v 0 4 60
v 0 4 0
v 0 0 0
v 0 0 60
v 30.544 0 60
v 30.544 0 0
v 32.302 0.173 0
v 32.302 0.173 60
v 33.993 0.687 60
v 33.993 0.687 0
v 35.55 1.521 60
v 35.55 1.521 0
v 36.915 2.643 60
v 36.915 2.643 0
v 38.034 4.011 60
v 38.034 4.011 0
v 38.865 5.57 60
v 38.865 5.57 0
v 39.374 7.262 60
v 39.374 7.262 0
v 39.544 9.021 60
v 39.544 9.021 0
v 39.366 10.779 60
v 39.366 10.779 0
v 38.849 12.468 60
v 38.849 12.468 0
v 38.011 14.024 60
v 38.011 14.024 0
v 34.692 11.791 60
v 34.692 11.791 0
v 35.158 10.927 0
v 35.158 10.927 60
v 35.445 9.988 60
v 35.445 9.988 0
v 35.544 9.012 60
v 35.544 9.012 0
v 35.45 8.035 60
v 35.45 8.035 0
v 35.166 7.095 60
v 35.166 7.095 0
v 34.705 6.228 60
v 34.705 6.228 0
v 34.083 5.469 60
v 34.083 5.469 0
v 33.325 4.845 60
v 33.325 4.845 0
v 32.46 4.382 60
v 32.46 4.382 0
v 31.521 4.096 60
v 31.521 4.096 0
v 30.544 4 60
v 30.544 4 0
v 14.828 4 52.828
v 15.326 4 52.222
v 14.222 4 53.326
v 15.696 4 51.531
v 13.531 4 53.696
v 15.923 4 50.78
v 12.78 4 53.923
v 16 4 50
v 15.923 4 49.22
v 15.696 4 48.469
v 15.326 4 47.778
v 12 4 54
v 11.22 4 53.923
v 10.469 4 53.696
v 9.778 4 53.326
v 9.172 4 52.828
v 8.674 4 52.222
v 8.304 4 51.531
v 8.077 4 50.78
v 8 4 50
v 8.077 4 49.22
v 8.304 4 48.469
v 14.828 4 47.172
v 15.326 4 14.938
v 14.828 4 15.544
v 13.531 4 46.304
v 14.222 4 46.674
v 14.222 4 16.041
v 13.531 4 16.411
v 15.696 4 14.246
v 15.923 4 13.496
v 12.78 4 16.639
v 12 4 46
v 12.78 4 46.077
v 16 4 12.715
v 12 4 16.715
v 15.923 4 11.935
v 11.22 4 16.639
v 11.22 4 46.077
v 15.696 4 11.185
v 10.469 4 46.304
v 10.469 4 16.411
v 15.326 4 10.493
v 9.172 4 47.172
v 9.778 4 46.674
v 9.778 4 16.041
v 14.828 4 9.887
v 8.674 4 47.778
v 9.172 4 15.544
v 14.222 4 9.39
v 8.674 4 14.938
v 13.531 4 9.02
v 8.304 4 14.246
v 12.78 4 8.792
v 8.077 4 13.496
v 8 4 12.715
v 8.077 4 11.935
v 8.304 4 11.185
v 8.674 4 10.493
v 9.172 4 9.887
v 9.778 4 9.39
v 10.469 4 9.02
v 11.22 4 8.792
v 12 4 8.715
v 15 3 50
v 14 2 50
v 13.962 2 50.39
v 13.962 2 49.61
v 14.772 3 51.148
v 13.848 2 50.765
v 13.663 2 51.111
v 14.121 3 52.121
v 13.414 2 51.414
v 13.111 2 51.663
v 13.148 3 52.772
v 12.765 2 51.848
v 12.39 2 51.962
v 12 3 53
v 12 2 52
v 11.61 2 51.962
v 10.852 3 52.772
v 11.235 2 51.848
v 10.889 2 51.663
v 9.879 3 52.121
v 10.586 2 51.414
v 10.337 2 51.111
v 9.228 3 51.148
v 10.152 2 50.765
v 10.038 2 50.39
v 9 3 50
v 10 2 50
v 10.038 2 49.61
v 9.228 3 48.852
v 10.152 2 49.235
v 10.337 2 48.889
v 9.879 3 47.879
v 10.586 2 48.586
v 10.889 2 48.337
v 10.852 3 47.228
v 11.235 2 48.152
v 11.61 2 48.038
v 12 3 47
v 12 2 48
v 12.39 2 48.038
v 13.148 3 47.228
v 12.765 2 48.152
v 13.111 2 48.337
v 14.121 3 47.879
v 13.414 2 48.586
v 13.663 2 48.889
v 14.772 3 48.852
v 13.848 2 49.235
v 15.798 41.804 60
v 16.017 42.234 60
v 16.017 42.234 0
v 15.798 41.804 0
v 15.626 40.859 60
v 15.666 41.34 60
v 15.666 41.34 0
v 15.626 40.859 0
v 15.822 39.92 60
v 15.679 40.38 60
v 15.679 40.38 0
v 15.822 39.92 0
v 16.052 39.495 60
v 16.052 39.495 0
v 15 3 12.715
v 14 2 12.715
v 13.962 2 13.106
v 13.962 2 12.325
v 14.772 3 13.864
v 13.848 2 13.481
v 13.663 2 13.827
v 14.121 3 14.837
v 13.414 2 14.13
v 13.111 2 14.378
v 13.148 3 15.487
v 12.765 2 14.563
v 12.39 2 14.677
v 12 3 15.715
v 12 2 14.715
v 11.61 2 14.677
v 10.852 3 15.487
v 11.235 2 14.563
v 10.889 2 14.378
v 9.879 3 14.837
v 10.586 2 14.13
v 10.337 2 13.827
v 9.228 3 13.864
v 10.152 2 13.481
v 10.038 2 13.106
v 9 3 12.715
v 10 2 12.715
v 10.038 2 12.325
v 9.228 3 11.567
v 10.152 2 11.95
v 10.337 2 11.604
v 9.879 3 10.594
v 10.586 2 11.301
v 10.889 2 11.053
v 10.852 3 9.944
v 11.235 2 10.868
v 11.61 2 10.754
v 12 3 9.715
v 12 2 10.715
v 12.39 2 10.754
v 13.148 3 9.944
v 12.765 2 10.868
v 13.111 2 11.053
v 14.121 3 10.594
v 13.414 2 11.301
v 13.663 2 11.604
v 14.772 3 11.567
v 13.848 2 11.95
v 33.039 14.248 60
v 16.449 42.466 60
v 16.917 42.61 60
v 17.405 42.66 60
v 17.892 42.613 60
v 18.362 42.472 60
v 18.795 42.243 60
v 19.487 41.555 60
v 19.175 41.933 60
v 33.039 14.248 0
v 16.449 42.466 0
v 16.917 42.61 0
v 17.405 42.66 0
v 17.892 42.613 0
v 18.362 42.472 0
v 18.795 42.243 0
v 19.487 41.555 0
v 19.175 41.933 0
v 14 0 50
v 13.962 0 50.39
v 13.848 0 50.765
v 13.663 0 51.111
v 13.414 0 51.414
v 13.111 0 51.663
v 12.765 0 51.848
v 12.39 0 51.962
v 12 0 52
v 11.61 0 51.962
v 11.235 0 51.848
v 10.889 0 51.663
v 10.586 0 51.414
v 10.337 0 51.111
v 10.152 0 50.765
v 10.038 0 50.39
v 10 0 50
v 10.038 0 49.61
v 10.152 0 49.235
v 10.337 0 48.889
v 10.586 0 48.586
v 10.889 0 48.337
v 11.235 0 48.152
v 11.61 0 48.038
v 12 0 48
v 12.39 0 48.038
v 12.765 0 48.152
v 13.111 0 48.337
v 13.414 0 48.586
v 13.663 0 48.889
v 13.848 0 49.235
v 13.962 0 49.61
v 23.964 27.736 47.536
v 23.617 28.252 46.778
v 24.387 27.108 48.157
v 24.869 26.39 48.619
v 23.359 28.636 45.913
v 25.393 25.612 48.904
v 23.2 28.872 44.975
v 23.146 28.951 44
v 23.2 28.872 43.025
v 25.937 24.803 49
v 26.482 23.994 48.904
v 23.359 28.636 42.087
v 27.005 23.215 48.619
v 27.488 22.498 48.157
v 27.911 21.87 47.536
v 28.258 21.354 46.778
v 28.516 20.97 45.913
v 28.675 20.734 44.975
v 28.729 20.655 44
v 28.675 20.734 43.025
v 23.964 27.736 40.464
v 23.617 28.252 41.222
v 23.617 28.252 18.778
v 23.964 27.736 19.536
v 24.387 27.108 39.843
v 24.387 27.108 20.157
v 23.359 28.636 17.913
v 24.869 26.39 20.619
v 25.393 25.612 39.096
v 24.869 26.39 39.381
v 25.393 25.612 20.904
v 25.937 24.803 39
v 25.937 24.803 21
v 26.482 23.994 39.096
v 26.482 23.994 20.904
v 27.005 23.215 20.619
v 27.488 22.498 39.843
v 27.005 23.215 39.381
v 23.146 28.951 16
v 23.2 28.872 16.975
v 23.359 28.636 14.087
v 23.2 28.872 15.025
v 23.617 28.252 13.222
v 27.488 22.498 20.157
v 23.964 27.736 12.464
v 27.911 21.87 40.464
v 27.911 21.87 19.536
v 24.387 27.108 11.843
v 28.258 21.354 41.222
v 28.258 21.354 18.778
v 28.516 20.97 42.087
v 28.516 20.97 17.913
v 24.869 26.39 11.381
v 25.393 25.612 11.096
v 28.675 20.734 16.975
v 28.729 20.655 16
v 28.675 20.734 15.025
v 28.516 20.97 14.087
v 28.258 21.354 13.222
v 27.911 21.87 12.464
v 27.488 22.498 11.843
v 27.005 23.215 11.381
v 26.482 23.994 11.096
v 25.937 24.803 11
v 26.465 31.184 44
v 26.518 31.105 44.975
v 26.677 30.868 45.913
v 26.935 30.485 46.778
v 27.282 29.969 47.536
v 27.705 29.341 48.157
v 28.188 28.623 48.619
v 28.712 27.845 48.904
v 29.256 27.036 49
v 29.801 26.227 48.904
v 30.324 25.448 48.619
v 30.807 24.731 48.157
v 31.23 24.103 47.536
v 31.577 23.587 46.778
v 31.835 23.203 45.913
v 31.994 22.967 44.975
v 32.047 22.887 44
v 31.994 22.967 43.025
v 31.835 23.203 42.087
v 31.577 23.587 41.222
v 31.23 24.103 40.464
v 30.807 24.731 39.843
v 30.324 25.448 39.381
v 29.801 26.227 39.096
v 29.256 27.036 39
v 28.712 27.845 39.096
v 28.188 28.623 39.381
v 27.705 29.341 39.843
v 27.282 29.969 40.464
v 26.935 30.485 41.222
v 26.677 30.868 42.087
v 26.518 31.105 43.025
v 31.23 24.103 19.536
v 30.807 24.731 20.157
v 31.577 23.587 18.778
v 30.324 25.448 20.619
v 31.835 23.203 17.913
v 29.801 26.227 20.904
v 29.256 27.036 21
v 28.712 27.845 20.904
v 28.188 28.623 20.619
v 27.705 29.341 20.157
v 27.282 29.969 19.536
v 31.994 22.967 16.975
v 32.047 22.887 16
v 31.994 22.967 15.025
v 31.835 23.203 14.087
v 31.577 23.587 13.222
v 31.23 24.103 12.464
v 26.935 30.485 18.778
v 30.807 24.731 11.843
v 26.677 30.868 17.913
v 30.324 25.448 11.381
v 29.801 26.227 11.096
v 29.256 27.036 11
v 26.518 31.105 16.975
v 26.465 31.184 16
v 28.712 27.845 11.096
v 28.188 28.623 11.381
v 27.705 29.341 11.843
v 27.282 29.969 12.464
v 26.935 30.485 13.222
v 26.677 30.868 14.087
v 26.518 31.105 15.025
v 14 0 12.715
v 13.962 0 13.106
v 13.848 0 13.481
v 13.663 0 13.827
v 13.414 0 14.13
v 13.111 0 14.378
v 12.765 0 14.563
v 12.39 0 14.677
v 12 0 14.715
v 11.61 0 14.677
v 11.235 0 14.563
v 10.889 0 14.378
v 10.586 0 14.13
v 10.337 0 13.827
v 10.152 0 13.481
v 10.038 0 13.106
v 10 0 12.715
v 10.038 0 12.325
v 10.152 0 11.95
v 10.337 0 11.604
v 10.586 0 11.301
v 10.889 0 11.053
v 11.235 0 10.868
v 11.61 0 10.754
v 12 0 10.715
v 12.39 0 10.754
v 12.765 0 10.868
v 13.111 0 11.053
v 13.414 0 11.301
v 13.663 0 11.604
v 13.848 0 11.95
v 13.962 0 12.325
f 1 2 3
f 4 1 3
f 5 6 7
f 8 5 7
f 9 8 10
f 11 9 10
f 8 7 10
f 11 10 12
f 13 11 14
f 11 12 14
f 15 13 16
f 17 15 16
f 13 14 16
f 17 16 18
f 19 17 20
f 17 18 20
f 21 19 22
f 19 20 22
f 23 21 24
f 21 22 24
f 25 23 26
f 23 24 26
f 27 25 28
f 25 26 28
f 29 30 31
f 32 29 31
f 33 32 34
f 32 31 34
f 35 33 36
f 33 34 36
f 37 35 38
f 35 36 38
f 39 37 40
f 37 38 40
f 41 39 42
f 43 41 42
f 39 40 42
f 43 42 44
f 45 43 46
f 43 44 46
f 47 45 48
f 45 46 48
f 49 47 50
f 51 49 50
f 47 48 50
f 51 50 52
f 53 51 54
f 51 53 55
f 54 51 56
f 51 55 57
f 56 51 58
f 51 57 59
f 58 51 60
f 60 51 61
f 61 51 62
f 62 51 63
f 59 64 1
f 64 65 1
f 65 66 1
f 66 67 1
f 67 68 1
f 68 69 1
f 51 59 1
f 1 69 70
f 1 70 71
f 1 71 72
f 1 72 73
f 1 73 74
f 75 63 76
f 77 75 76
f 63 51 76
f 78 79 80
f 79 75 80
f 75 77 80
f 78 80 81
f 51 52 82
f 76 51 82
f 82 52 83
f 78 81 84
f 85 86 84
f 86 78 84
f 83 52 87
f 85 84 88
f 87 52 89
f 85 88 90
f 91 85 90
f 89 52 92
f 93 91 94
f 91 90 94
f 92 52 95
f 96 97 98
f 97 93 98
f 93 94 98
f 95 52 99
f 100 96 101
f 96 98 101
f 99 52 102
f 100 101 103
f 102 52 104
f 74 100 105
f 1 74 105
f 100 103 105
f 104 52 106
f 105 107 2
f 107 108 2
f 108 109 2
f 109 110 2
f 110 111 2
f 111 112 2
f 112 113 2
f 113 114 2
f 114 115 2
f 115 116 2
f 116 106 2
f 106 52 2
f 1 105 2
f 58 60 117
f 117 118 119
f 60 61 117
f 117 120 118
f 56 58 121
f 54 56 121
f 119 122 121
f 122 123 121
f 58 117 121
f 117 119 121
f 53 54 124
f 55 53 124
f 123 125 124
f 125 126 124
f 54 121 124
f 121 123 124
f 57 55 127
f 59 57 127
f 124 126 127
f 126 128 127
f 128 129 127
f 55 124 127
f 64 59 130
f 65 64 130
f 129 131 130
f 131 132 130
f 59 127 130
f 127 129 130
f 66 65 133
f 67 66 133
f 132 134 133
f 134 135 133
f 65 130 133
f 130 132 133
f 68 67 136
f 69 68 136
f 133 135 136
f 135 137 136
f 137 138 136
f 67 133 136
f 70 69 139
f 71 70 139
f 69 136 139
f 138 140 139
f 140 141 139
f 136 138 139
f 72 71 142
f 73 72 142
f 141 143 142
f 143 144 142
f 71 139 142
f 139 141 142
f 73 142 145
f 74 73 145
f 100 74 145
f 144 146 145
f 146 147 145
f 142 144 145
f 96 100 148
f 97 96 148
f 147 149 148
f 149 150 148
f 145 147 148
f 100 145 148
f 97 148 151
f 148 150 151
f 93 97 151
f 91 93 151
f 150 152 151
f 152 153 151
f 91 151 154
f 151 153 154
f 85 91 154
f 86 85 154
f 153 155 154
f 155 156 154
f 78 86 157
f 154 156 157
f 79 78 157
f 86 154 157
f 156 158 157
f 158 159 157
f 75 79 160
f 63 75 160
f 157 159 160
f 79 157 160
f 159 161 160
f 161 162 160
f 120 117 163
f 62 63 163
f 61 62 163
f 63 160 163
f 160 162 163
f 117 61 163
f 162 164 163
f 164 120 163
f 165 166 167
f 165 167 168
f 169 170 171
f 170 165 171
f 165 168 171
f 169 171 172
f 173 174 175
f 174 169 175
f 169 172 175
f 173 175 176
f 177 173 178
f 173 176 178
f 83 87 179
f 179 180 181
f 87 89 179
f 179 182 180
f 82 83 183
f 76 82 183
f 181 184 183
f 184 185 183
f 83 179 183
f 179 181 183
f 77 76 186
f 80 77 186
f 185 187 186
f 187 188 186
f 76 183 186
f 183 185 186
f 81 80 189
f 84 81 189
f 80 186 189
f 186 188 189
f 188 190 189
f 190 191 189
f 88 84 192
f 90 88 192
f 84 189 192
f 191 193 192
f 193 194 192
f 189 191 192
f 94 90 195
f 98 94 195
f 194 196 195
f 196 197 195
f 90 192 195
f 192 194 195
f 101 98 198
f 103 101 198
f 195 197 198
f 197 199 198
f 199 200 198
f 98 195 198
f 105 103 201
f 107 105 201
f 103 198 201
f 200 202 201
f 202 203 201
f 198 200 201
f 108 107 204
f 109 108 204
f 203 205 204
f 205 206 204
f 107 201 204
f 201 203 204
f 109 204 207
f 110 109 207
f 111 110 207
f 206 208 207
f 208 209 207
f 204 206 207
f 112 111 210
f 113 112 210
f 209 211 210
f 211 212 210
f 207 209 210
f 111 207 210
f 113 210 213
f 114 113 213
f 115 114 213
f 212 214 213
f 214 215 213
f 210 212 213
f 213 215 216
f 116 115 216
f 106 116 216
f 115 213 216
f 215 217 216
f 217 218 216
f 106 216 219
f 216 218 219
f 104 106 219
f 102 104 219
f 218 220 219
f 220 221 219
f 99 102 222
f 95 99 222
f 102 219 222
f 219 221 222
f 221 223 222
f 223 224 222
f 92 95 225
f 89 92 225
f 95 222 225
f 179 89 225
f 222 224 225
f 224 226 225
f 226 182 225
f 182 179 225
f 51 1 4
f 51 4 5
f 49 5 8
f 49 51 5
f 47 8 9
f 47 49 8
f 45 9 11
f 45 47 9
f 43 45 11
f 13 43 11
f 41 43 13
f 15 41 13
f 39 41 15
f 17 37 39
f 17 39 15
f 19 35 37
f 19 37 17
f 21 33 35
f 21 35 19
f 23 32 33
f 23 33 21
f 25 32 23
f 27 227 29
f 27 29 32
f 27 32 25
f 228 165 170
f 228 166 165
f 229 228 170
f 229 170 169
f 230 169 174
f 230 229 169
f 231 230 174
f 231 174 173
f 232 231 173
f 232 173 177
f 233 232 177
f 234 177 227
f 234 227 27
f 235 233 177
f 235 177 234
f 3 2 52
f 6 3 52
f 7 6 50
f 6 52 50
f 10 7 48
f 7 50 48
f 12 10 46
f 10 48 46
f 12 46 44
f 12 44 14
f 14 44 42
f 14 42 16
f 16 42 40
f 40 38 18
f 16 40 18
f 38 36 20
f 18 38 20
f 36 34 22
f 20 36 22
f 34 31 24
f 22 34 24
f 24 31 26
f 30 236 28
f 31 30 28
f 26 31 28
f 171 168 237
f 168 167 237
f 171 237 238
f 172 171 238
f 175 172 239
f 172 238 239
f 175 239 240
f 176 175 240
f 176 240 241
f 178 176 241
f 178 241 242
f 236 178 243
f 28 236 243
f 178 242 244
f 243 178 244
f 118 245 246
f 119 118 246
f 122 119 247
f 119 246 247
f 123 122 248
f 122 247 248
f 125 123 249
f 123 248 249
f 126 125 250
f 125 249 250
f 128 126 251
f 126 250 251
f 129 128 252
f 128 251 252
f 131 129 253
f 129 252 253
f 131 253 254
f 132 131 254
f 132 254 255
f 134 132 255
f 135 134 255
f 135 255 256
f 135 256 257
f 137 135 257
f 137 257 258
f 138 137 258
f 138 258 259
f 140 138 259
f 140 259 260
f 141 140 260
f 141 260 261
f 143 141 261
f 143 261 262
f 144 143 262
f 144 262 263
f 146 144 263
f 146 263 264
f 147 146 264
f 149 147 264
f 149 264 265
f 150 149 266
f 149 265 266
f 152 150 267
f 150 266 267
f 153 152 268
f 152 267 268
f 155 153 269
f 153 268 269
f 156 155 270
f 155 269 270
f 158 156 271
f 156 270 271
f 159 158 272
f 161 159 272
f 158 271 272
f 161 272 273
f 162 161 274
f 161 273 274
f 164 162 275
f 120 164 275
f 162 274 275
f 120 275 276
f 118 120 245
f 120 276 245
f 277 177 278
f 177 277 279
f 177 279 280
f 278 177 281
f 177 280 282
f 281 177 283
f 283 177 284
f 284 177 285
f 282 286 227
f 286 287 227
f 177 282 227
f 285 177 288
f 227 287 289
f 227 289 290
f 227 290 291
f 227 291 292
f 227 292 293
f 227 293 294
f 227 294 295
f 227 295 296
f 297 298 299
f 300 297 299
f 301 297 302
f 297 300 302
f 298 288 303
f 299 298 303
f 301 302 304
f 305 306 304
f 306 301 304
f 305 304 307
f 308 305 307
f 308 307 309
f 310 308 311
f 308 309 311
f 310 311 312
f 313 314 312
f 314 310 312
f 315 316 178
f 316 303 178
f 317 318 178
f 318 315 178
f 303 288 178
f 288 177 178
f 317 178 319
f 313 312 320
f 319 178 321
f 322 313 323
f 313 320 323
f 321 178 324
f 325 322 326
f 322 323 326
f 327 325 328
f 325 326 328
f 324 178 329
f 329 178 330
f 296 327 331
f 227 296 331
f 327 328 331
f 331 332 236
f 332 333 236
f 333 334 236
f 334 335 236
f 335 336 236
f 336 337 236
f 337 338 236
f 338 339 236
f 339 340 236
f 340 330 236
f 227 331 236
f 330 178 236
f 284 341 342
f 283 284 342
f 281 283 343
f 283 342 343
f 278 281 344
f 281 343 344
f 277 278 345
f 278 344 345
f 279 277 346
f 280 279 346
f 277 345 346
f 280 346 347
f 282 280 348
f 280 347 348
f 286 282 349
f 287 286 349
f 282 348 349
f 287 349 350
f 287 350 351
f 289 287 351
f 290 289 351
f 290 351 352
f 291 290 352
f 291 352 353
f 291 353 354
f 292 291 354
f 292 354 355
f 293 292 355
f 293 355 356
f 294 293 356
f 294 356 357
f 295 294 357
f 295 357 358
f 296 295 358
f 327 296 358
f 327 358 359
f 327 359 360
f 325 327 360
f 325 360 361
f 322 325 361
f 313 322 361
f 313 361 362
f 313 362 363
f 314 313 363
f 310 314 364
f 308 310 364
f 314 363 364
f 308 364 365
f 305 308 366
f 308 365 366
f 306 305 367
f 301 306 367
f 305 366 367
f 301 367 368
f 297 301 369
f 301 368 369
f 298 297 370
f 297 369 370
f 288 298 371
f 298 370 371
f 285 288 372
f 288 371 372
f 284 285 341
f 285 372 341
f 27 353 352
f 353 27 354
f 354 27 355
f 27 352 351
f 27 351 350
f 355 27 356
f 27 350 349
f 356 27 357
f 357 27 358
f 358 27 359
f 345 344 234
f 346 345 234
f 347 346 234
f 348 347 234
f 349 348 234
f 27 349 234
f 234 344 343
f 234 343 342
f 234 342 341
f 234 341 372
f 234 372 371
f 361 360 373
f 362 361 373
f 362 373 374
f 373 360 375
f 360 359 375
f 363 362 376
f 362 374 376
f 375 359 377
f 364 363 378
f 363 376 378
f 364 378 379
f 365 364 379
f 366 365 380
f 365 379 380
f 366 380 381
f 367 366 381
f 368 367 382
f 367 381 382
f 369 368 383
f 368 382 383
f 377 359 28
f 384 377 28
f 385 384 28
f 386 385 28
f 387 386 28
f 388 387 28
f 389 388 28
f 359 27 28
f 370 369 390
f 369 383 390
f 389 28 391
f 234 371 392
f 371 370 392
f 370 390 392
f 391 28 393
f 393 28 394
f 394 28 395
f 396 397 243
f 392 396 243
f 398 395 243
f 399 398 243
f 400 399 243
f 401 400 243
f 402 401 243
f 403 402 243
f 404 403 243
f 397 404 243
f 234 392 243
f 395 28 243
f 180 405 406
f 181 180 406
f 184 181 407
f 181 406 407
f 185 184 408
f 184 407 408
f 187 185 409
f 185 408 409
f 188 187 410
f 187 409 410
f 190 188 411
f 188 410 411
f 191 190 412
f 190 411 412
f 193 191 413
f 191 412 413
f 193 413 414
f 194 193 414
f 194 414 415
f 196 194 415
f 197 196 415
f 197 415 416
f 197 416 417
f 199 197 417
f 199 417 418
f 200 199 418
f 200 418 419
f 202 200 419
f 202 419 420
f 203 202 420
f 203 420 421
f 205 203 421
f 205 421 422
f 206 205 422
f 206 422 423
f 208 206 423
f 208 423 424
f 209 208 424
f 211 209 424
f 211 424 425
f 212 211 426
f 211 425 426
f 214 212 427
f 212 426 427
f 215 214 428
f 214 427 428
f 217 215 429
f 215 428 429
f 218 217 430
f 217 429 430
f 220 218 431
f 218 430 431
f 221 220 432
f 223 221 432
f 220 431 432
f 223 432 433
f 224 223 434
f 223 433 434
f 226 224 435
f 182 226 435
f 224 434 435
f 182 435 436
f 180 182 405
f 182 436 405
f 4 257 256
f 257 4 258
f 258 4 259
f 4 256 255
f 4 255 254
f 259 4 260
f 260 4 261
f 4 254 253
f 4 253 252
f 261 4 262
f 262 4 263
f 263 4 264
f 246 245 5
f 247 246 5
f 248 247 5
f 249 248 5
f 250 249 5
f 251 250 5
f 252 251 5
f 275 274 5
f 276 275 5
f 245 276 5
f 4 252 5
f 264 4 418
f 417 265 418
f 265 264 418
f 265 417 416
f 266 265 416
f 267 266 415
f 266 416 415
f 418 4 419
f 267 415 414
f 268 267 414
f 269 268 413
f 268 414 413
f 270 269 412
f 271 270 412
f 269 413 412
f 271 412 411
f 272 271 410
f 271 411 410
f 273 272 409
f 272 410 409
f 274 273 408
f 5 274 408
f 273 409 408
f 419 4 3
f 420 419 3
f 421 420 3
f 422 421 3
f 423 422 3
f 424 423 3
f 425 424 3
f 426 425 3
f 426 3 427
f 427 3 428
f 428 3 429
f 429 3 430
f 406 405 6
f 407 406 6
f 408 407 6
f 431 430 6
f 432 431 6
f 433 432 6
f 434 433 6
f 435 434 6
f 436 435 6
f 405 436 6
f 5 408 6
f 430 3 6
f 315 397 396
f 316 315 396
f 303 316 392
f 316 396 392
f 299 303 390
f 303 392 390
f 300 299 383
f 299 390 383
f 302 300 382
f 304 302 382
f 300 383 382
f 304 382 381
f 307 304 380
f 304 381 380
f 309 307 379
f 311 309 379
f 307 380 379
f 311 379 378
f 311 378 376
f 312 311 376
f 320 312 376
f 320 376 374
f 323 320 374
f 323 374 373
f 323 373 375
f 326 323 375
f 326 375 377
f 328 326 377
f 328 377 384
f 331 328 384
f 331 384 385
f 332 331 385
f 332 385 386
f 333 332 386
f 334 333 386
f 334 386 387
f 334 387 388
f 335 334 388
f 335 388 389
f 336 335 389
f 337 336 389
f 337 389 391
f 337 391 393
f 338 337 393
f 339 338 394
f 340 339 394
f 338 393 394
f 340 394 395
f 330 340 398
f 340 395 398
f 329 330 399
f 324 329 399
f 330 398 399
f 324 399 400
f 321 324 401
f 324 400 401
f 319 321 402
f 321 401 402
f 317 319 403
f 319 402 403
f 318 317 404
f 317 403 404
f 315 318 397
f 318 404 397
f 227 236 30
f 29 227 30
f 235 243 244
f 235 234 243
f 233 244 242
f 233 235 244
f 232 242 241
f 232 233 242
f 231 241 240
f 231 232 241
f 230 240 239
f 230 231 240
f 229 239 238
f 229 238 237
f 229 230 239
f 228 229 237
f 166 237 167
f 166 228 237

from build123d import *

# Parameters (mm, degrees)
F1_DEPTH    = 60
F2_R        = 5
F3_DEPTH    = 25
F4_R        = 2
F5_DEPTH    = 25
F6_SIZE     = 2
F7_SIZE     = 2
F8_R        = 2.5
F9_T1_DEPTH = 71.4564392374


# Not quite as in the source:
# - a fillet or chamfer that OpenCascade refuses, or shapes differently, is made with other operations: its cross-section is extruded or revolved along the edge and cut away or added


with BuildPart() as f1:
    # F0 (on Top) → F1 (new body)
    with BuildSketch(Plane.XY):
        with BuildLine():
            Line((0, 4), (0, 0))
            Line((0, 0), (30.5437369547, 0))
            ThreePointArc((30.5437369547, 0), (38.4878384458, 4.7701948627), (38.0108483544, 14.0241663334))
            Line((38.0108483544, 14.0241663334), (18.0912535296, 43.6294428556))
            Line((18.0912535296, 43.6294428556), (14.7725373519, 41.3964800408))
            Line((14.7725373519, 41.3964800408), (33.0393692072, 14.2476041216))
            Line((33.0393692072, 14.2476041216), (34.6921321767, 11.7912035185))
            ThreePointArc((34.6921321767, 11.7912035185), (34.957126672, 6.650108257), (30.5437369547, 4))
            Line((30.5437369547, 4), (0, 4))
        make_face()
    extrude(amount=F1_DEPTH)

    # F2 (on face) → F3 (cut)
    with BuildSketch(Plane(origin=(32.6608671723, 21.9755164324, 0), x_dir=(-0.5582407037, 0.8296790444, 0), z_dir=(0.8296790444, 0.5582407037, 0))):
        with Locations((6.0991603551, 44)):
            Circle(F2_R)
        with Locations((6.0991603551, 16)):
            Circle(F2_R)
    extrude(amount=-F3_DEPTH, mode=Mode.SUBTRACT)

    # F4 (on face) → F5 (cut)
    with BuildSketch(Plane.XZ):
        with Locations((12, 12.7154784277)):
            Circle(F4_R)
        with Locations((12, 50)):
            Circle(F4_R)
    extrude(amount=-F5_DEPTH, mode=Mode.SUBTRACT)

    # F6
    f6_edges = [f1.edges().sort_by_distance(p)[0] for p in [
        (10, 4, 12.715478),
    ]]
    chamfer(f6_edges, length=F6_SIZE)

    # F7
    f7_edges = [f1.edges().sort_by_distance(p)[0] for p in [
        (10, 4, 50),
    ]]
    chamfer(f7_edges, length=F7_SIZE)

    # F8
    f8_edges = [f1.edges().sort_by_distance(p)[0] for p in [
        (18.091254, 43.629443, 30),
    ]]
    fillet(f8_edges, radius=F8_R)

    # F9: fillet of radius 2.5 on 1 edges, made by hand

    # F9_s2 → F9_t1 (cut)
    with BuildSketch(Plane.XY.offset(-5.7282196187)):
        with BuildLine():
            ThreePointArc((16.0170559185, 42.2338410964), (15.6260243102, 40.8594889036), (16.0516274923, 39.495446529))
            Line((16.0516274923, 39.495446529), (14.7725373519, 41.3964800408))
            Line((14.7725373519, 41.3964800408), (16.0170559185, 42.2338410964))
        make_face()
    extrude(amount=F9_T1_DEPTH, mode=Mode.SUBTRACT)


solid = f1.part
